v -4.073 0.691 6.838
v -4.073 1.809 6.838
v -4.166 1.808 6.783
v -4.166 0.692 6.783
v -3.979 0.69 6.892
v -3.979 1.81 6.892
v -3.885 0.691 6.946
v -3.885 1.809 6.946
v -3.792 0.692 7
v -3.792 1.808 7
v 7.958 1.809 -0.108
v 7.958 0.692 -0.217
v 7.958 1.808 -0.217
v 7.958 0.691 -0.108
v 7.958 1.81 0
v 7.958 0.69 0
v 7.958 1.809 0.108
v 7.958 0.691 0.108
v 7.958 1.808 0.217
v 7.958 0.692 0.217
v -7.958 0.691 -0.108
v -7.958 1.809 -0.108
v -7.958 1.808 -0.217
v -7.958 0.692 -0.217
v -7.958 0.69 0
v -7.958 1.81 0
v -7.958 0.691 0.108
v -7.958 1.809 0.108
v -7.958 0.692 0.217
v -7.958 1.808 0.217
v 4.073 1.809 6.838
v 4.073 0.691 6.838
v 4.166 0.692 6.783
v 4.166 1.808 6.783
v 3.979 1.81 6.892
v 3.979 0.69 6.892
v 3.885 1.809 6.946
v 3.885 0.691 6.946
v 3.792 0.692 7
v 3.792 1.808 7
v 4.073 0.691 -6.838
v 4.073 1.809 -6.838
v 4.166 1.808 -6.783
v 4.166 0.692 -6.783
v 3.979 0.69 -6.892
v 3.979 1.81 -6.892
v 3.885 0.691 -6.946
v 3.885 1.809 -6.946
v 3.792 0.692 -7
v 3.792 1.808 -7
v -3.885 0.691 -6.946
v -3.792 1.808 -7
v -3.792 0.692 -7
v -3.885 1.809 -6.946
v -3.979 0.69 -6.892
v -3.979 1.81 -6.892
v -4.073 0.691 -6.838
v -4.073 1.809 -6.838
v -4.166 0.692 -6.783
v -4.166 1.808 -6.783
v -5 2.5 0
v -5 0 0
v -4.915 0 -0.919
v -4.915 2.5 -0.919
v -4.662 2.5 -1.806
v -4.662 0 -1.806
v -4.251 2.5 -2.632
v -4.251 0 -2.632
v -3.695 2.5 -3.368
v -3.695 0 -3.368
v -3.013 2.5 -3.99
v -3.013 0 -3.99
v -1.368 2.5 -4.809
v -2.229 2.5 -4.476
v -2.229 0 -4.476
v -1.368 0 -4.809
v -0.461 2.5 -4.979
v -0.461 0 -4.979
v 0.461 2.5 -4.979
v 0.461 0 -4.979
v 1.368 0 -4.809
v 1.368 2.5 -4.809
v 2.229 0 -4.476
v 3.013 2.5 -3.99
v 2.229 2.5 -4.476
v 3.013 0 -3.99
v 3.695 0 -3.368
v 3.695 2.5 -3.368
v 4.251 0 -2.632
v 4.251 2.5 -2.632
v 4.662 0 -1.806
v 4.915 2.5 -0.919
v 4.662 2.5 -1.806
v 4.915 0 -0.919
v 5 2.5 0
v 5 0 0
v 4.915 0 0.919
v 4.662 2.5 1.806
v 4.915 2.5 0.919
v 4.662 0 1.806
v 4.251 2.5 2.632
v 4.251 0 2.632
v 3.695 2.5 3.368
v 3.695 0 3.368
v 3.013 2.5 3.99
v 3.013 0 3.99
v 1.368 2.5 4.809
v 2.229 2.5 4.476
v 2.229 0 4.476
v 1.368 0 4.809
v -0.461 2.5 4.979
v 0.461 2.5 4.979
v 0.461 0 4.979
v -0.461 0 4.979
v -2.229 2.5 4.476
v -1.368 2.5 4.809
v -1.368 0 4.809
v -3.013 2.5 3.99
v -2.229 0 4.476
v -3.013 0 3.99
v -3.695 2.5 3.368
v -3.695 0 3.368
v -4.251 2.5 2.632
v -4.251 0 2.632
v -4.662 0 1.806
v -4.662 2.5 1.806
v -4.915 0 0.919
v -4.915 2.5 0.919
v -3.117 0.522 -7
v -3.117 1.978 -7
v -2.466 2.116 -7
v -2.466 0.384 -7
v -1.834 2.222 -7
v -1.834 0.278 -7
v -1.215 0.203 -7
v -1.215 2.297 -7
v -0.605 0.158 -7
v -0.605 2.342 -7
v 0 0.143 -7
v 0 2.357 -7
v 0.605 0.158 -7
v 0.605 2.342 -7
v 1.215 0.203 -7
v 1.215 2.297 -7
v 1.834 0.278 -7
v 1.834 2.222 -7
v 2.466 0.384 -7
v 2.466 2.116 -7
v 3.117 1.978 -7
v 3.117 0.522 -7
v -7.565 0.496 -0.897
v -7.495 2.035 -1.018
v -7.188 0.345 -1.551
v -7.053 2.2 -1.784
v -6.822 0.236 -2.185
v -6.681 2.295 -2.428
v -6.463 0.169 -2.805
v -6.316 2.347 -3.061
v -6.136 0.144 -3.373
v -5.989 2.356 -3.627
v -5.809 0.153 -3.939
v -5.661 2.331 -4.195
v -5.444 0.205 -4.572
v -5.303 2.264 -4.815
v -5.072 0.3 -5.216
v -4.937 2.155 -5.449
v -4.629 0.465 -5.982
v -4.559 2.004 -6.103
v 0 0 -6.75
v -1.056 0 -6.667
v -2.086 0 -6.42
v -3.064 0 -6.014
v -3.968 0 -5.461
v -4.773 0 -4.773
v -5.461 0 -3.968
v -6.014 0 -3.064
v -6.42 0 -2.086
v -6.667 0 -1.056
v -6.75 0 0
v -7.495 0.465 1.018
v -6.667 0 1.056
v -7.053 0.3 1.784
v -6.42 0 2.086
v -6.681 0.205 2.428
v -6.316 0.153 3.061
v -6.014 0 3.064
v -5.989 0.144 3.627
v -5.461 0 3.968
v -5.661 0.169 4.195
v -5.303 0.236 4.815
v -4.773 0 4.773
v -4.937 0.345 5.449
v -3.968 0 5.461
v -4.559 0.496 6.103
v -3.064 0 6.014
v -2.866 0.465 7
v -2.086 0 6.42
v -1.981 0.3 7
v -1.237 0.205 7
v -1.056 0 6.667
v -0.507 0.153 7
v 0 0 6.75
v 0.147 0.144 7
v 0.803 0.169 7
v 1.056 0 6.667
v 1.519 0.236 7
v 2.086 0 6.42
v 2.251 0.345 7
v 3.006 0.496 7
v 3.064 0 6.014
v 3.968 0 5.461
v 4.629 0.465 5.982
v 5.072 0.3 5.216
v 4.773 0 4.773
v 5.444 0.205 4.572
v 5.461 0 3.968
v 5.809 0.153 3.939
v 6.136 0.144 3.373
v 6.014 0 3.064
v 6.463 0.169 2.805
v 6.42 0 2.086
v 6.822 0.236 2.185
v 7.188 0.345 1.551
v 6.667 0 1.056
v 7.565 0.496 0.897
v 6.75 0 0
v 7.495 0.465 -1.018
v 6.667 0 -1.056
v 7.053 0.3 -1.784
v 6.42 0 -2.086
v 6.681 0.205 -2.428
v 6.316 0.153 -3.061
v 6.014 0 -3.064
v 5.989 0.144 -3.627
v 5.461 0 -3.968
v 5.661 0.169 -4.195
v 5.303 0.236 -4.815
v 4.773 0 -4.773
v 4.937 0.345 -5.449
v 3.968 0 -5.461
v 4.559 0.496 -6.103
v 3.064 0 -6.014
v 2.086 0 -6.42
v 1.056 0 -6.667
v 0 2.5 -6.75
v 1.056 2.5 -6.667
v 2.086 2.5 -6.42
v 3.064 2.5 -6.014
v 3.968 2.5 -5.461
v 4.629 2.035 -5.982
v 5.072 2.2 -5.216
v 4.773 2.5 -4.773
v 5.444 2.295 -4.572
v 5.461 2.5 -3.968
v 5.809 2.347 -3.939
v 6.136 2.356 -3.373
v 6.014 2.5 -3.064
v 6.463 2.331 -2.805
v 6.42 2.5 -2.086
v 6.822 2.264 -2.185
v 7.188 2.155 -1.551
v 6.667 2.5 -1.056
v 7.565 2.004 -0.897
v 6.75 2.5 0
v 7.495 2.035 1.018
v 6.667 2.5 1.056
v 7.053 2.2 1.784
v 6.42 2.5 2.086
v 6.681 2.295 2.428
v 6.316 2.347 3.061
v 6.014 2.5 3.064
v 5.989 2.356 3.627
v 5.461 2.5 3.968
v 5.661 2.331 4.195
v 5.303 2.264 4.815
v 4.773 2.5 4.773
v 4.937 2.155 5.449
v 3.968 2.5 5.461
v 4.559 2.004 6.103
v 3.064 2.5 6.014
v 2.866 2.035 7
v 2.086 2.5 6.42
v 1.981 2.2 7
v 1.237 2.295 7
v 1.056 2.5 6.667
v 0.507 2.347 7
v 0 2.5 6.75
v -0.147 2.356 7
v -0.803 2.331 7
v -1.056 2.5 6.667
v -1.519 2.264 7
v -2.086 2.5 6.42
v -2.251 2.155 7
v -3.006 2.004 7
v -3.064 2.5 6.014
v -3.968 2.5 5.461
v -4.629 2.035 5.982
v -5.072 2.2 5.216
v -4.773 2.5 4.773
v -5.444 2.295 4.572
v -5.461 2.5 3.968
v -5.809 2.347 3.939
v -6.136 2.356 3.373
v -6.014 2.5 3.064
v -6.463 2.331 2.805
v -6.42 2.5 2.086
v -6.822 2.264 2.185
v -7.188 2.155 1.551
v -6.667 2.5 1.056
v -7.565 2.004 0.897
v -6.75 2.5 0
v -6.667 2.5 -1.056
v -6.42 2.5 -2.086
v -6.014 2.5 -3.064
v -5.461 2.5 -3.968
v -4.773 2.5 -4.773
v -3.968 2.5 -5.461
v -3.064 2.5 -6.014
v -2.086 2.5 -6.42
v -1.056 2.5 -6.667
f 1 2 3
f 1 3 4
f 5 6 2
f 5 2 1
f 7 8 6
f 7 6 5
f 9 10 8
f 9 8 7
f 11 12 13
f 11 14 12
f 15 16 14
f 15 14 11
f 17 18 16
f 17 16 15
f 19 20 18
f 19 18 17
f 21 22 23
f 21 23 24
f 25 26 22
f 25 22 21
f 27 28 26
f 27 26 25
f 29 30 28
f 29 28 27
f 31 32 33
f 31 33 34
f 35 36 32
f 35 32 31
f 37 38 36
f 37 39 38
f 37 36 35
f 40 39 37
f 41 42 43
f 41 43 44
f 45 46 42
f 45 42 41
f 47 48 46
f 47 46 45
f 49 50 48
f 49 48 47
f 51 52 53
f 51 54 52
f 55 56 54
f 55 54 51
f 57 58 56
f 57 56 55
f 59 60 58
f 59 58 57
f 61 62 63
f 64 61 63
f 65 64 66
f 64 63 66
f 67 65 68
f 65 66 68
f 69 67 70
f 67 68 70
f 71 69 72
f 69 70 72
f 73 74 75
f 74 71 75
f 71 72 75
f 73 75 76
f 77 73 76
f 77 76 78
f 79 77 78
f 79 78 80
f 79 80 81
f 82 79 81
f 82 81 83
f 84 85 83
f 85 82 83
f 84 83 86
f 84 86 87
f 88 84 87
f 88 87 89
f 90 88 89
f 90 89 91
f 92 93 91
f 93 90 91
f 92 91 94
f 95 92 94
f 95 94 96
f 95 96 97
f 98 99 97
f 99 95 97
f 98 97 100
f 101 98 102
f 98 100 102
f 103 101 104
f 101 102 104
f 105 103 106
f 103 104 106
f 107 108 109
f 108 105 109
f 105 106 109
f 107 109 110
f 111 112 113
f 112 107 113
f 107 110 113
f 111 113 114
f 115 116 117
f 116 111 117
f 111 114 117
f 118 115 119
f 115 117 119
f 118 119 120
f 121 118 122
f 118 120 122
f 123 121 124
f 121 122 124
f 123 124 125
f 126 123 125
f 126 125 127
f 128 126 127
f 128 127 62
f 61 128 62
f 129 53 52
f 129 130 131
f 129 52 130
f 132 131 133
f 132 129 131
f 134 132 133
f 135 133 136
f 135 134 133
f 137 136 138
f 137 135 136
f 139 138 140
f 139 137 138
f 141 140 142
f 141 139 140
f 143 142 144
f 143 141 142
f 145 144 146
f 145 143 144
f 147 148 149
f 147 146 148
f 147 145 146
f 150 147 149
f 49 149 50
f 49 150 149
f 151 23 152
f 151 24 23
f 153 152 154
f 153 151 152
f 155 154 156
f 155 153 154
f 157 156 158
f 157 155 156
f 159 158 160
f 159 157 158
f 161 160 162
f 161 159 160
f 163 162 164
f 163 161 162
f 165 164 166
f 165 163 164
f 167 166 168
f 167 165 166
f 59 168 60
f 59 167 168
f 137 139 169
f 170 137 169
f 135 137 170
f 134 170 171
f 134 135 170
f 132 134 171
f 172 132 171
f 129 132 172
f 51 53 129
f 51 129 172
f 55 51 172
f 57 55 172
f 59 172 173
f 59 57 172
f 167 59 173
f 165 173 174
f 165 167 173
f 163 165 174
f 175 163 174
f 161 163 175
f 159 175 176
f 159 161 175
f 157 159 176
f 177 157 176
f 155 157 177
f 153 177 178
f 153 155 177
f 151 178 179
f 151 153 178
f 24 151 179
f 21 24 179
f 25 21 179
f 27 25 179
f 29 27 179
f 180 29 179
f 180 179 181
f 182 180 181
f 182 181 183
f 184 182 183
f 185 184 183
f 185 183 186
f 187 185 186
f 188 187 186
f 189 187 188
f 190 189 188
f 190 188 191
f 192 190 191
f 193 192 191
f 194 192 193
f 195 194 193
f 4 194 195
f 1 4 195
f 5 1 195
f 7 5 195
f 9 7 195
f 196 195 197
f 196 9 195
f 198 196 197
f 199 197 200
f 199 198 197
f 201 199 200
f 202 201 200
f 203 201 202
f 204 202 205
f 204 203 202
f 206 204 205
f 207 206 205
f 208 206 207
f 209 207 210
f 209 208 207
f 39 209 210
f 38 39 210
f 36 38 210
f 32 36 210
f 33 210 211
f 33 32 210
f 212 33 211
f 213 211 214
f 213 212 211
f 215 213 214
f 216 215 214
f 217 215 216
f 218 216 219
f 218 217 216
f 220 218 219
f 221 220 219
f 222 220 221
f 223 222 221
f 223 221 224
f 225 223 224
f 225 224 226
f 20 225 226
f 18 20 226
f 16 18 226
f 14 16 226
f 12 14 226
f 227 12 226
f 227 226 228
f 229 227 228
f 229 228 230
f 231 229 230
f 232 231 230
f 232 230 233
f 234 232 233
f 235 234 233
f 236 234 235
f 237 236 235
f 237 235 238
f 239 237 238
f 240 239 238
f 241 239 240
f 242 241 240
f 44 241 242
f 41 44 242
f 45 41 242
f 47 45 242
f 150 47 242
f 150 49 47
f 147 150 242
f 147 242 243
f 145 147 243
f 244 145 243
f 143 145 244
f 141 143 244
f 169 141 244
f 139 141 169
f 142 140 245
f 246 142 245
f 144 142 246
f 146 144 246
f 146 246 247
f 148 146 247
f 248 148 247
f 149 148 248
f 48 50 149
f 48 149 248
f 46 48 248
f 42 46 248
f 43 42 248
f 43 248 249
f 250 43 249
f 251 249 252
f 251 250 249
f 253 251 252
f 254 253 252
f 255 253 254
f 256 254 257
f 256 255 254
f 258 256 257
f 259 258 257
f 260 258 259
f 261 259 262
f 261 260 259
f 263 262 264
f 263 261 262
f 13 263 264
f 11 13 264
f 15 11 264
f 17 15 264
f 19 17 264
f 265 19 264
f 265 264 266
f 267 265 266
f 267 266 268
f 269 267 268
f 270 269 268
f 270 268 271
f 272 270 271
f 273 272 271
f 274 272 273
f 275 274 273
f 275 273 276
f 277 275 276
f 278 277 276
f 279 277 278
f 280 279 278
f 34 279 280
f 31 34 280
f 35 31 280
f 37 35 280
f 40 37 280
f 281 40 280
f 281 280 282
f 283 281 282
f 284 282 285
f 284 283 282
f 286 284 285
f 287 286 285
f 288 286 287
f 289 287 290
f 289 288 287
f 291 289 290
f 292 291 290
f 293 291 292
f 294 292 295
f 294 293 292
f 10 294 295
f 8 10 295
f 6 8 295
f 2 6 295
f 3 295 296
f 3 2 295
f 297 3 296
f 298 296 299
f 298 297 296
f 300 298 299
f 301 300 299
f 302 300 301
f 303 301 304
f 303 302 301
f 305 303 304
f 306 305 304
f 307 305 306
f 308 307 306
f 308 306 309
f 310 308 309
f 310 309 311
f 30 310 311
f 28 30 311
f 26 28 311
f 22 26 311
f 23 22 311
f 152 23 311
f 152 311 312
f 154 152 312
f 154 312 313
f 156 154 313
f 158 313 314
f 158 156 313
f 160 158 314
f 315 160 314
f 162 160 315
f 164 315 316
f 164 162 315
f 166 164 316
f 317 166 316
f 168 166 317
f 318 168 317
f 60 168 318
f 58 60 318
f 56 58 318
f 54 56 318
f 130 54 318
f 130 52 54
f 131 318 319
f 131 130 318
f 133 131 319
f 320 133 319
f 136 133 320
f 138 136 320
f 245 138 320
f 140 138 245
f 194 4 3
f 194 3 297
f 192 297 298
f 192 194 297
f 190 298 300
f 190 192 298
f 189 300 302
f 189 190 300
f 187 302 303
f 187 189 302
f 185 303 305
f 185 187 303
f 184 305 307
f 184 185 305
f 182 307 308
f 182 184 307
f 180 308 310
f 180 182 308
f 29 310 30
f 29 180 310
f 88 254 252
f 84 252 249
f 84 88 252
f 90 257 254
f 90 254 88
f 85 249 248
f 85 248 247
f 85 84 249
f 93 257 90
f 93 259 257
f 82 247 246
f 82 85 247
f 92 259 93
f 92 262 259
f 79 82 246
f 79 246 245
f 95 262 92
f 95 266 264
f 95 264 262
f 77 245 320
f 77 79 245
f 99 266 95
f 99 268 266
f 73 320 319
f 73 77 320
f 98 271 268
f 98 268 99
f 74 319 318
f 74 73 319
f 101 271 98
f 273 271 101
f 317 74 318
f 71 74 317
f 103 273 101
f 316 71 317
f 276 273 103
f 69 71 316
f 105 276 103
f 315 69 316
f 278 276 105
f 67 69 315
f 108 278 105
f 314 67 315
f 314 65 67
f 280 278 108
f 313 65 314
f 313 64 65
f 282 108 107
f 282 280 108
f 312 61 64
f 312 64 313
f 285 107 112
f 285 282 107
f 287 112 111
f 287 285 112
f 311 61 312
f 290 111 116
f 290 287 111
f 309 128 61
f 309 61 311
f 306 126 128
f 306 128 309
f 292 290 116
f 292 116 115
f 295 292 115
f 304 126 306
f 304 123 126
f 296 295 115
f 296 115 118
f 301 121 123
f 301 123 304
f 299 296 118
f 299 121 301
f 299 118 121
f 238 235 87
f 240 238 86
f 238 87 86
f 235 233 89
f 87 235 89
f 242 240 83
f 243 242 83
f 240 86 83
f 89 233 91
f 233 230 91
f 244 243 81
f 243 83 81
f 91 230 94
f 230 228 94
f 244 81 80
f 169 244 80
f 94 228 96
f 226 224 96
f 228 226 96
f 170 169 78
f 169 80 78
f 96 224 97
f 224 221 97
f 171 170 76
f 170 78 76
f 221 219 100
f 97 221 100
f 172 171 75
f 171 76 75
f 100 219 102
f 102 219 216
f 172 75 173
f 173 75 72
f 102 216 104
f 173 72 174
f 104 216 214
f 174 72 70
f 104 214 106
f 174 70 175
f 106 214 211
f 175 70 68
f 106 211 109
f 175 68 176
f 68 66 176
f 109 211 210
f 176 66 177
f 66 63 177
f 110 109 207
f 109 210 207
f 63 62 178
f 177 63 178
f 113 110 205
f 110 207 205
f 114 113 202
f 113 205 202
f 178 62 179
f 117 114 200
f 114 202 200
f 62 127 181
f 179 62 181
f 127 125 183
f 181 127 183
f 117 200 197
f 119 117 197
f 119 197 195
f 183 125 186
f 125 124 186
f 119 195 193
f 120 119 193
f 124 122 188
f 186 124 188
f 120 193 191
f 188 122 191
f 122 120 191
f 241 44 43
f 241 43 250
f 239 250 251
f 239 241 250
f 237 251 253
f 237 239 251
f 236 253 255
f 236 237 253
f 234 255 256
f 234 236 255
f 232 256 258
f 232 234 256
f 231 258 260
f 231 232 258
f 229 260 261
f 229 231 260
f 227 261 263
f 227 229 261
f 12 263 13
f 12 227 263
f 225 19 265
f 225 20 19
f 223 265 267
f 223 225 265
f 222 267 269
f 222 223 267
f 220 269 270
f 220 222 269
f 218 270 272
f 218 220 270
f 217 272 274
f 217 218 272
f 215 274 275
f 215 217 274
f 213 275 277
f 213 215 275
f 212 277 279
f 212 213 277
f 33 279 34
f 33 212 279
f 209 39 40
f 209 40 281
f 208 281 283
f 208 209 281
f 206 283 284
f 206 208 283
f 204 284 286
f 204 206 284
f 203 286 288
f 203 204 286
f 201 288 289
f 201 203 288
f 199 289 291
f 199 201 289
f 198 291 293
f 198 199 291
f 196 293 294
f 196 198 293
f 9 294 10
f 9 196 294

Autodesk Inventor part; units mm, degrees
ref_plane "YZ Plane" through (0, 0, 0) normal (1, 0, 0) x (0, 1, 0)
ref_plane "XZ Plane" through (0, 0, 0) normal (0, 1, 0) x (-1, 0, 0)
ref_plane "XY Plane" through (0, 0, 0) normal (0, 0, 1) x (1, 0, 0)
sketch "Sketch1" plane through (0, 0, 0) normal (0, 1, 0) x (-1, 0, 0)
  line L0 (-4.0415, -7) -> (-8.0829, 0)
  line L1 (-8.0829, 0) -> (-4.0415, 7)
  line L2 (-4.0415, 7) -> (4.0415, 7)
  line L3 (4.0415, 7) -> (8.0829, 0)
  line L4 (8.0829, 0) -> (4.0415, -7)
  line L5 (4.0415, -7) -> (-4.0415, -7)
  circle A0 centre (0, 0) radius 5
  dimension "d0" = 14
  dimension "d1" = 10
extrude "Extrusion1" add sketch "Sketch1" along normal blind 2.5
thread "Thread1" size "M10x0.75" class "6H" standard "ANSI Metric M Profile" full length
sketch "Sketch3" plane through (0, 0, 0) normal (1, 0, 0) x (0, 1, 0)
  line L0 (3.5, -5) -> (3.5, -9)
  line L1 (3.5, -9) -> (-1, -9)
  line L2 (2.5, -7) -> (2.5, 0) projected
  line L3 (0, -7) -> (2.5, -7) projected
  line L4 (0, 0) -> (10, 0) construction
  line L5 (-1, -9) -> (-1, -5)
  line L6 (-1, -5) -> (1, -8.5)
  line L7 (1, -8.5) -> (1.5, -8.5)
  line L8 (1.5, -8.5) -> (3.5, -5)
  line L9 (0, 0) -> (0, -7) projected
  dimension "d7" = 1
  dimension "d8" = 4
  dimension "d9" = 2
  dimension "d11" = 10
  dimension "d14" = 0.5
  dimension "d15" = 1
  dimension "d16" = 0.5
  dimension "d17" = 4
  dimension "d18" = 1
revolve "Revolution1" cut sketch "Sketch3" angle 360 about axis through (0, 0, 0) along (0, 1, 0) contours L0 L1 L5 L6 L9 L3 L7 L8 L2 | L2 L3 L8 | L3 L9 L6
chamfer "Chamfer1" distance 0.25 angle 45 6 edges at (-8.0829, 1.25, 0) (-4.0415, 1.25, -7) (4.0415, 1.25, -7) (8.0829, 1.25, 0) (4.0415, 1.25, 7) (-4.0415, 1.25, 7)
equation "\"d17\" = d8"
properties part number "4024-86" material "Brass"
